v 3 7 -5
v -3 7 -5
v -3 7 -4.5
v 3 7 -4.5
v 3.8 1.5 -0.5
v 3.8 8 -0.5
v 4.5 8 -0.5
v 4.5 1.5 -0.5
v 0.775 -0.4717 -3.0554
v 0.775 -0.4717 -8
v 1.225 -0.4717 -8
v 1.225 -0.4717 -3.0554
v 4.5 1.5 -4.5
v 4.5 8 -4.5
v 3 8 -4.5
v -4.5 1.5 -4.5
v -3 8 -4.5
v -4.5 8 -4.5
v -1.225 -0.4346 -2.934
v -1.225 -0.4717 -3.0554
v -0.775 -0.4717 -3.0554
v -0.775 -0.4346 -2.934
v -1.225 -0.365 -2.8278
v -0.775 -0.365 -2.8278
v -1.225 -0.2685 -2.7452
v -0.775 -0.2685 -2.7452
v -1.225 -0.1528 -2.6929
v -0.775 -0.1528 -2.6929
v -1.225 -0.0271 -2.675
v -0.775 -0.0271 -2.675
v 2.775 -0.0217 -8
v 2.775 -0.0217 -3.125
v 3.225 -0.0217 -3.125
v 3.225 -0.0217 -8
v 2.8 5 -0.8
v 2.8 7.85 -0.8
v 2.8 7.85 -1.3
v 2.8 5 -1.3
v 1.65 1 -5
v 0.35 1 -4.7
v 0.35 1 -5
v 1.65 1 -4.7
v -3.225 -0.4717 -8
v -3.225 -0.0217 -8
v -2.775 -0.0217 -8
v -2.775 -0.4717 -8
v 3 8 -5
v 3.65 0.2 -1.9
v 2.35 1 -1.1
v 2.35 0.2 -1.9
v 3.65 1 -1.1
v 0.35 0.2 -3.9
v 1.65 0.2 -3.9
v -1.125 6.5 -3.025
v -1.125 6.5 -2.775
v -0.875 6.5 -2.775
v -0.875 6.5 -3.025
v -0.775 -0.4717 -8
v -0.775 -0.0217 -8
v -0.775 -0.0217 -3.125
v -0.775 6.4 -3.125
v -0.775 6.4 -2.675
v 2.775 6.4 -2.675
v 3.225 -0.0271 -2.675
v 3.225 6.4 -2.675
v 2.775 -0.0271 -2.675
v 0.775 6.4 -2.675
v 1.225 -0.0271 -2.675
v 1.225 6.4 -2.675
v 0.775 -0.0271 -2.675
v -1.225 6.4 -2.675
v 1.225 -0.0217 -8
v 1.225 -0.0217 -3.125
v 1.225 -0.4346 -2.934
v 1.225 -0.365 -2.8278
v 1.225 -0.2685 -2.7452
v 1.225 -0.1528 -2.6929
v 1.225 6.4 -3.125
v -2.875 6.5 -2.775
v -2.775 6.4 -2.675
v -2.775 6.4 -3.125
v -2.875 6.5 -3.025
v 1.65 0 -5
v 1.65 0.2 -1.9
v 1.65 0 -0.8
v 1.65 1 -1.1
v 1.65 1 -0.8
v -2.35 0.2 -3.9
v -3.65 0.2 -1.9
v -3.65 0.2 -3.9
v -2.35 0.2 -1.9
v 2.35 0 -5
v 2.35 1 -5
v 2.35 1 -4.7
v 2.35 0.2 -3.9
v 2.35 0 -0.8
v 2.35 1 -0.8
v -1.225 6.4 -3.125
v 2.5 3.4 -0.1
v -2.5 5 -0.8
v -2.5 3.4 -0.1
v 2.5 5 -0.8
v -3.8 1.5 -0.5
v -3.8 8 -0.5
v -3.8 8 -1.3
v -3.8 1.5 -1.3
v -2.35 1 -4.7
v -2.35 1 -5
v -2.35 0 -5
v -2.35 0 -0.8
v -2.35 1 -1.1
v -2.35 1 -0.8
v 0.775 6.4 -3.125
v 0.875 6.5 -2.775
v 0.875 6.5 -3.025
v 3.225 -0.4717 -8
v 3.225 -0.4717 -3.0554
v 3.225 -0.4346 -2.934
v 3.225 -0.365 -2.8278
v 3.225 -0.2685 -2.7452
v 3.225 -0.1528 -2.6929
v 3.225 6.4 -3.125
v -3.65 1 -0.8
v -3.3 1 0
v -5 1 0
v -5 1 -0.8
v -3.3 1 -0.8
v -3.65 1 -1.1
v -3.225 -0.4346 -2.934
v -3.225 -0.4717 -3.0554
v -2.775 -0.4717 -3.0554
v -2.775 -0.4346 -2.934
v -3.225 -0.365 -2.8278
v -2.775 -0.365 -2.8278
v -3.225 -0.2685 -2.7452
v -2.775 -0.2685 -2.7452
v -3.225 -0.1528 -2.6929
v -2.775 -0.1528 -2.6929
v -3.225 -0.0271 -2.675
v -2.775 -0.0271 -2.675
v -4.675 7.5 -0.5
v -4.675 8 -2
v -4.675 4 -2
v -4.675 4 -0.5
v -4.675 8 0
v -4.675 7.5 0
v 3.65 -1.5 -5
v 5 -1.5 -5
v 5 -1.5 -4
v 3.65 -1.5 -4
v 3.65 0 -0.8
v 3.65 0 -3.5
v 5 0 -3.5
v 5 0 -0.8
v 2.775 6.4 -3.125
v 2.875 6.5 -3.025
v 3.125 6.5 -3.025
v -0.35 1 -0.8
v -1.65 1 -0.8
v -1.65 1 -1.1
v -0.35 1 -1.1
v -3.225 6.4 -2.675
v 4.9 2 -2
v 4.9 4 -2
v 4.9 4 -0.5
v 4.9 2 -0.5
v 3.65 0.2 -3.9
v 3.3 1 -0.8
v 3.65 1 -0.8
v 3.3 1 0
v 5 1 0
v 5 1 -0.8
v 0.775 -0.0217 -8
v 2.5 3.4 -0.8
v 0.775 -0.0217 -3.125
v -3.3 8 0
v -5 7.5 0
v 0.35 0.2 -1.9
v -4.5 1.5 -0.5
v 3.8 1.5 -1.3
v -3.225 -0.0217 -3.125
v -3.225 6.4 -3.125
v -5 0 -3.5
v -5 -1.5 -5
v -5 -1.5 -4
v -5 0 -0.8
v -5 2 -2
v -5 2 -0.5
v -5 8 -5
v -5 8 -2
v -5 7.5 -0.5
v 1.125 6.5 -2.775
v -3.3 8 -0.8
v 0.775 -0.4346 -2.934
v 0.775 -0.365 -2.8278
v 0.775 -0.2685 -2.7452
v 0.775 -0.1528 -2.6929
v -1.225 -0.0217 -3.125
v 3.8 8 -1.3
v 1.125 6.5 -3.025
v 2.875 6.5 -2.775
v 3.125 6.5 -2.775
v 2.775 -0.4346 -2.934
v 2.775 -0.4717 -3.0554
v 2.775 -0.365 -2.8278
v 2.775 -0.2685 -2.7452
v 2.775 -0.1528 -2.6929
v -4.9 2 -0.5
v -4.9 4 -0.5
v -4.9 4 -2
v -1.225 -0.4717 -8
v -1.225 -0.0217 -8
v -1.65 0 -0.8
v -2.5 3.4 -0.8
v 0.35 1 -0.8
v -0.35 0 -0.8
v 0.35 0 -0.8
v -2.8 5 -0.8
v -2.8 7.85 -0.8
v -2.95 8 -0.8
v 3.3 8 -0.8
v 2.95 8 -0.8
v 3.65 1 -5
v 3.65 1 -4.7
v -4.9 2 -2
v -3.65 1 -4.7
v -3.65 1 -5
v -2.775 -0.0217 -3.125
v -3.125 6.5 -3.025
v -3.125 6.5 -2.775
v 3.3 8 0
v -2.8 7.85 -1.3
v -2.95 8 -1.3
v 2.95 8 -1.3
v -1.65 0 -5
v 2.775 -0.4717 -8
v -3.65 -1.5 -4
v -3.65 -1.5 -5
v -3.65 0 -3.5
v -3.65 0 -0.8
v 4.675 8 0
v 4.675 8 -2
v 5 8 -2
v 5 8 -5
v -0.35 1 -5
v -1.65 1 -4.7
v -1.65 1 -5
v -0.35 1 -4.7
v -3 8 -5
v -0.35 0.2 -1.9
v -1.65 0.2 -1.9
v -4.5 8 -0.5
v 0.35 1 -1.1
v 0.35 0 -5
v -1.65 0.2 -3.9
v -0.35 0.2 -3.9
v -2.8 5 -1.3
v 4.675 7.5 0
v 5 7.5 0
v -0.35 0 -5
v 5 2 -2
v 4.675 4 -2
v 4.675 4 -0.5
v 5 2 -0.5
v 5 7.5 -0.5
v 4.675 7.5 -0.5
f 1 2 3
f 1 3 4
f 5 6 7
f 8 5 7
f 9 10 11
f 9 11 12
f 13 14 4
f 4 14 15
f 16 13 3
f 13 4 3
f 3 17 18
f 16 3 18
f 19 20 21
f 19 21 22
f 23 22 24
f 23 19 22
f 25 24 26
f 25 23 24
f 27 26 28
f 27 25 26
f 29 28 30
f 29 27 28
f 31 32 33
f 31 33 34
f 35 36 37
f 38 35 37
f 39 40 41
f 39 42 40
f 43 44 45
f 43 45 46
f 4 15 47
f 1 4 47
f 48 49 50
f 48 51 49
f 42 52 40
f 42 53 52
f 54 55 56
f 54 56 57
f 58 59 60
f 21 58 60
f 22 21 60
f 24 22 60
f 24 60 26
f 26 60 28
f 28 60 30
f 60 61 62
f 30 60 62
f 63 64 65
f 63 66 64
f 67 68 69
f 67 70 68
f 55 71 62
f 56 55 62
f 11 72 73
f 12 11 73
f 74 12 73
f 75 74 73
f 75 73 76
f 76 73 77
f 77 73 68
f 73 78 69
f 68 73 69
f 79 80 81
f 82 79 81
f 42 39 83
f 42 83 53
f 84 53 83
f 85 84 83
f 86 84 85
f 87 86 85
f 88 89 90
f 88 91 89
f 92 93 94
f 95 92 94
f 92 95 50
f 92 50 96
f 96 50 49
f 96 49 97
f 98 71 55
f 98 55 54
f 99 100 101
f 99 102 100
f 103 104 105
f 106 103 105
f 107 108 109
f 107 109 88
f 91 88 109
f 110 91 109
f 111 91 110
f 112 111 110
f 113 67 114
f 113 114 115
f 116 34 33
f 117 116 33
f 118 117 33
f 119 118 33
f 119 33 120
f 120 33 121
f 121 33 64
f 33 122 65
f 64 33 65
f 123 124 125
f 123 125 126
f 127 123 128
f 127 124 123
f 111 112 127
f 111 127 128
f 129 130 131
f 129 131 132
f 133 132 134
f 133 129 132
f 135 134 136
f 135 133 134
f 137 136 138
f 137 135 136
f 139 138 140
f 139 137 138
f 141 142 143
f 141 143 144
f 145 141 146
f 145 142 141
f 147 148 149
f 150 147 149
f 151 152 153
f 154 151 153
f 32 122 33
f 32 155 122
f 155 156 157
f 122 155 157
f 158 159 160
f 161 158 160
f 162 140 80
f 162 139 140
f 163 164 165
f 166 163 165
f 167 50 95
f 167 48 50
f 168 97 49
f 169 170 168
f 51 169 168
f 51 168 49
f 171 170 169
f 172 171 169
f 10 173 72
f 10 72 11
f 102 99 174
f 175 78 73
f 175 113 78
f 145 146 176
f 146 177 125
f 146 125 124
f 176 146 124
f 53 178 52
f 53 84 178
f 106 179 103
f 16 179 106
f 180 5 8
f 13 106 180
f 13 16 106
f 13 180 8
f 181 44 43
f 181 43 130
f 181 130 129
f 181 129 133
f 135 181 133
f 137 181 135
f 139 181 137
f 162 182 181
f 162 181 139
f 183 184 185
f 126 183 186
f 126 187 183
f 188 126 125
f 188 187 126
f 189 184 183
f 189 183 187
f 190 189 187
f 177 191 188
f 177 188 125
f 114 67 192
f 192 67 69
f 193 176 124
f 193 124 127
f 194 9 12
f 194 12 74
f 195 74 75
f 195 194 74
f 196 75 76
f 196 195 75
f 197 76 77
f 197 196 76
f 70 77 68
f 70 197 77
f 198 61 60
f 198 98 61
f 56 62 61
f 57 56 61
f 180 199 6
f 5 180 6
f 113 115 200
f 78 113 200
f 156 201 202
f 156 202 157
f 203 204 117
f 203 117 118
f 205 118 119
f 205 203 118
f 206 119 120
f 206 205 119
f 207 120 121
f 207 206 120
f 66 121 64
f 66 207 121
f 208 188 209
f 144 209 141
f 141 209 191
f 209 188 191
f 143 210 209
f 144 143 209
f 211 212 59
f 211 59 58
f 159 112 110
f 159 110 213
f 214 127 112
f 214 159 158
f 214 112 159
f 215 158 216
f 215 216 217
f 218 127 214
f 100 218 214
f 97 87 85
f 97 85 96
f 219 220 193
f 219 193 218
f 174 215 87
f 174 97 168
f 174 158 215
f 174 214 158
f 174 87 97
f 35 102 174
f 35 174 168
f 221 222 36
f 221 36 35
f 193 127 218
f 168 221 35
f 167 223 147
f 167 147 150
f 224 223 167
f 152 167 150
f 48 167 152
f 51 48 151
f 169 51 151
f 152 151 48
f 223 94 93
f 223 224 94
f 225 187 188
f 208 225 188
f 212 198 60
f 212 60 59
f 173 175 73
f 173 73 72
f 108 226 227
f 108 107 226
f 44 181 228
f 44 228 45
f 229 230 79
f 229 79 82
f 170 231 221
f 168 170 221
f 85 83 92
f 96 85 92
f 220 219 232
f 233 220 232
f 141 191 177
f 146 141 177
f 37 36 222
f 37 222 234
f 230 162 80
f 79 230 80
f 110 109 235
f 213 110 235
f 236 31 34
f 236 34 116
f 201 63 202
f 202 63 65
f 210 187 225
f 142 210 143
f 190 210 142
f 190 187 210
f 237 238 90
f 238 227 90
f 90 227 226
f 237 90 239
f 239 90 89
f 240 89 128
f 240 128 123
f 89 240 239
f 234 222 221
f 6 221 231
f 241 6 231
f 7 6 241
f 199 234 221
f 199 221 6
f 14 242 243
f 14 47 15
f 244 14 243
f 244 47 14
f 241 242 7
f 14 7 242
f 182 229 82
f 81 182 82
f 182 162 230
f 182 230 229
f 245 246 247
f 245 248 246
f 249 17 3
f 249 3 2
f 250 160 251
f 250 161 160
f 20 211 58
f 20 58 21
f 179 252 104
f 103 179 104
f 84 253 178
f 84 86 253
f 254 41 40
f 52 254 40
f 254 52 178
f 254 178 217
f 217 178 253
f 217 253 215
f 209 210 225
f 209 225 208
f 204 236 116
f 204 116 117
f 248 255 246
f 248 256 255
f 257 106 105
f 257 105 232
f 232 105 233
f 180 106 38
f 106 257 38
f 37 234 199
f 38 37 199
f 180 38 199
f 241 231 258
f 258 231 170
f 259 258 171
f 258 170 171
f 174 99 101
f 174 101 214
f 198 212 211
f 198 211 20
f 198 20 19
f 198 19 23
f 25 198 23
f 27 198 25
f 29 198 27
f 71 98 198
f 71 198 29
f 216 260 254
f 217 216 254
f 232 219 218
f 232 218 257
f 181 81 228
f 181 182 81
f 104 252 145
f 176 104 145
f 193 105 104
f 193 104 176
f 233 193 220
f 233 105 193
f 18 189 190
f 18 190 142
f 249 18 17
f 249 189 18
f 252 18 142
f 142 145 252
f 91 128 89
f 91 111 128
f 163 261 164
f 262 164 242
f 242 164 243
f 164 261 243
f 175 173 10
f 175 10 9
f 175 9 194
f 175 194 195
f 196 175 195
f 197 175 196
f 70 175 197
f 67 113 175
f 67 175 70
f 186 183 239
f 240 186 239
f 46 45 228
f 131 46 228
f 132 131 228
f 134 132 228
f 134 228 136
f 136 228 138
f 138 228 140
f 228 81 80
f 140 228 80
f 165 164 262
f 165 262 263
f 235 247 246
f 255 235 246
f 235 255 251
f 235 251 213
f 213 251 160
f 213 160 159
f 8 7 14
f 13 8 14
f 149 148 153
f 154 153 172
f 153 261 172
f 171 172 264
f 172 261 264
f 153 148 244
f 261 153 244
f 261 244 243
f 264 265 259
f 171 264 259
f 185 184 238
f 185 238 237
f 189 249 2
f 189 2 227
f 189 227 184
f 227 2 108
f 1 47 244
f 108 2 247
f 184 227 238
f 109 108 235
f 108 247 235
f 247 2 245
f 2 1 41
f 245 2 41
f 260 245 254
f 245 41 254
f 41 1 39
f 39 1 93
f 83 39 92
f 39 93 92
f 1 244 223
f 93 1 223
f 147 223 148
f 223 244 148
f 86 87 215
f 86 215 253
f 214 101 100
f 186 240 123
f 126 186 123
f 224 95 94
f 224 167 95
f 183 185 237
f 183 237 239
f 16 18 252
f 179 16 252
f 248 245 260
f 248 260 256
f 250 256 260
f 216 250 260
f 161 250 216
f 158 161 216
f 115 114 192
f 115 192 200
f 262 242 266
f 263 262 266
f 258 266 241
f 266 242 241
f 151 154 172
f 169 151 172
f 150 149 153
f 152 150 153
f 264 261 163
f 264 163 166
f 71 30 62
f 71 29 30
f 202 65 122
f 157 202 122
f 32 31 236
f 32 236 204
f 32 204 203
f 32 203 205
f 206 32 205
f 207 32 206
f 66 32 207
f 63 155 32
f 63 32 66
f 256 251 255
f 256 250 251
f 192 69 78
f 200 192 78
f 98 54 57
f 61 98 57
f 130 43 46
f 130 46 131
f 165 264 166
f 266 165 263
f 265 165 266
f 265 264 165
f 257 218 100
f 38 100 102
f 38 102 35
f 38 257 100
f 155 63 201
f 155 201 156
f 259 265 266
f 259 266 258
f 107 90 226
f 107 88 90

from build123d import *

# Parameters (mm, degrees)
ESQUISSE1_W                = 10
ESQUISSE1_H                = 5
BOSS_EXTRU_1_DEPTH         = 8
ESQUISSE7_W                = 0.8
ESQUISSE7_H                = 1
ENL_V_MAT_EXTRU_5_DEPTH    = 14.747727085
ENL_V_MAT_EXTRU_6_DEPTH    = 0.65
R_P_TITION_LIN_AIRE3_COUNT = 4
R_P_TITION_LIN_AIRE3_PITCH = 2
ESQUISSE2_W                = 6.6
ESQUISSE2_H                = 1.6
ENL_V_MAT_EXTRU_1_DEPTH    = 11.677078252
ENL_V_MAT_EXTRU_2_DEPTH    = 6.5
ESQUISSE5_W                = 6
ESQUISSE5_H                = 1
ENL_V_MAT_EXTRU_3_DEPTH    = 1
ESQUISSE6_W                = 5.6
ESQUISSE6_H                = 1
ENL_V_MAT_EXTRU_4_DEPTH    = 3
BOSS_EXTRU_2_DEPTH         = 2.5
CHANFREIN1_SIZE            = 0.15
EXTRU_MINCE2_DEPTH         = 0.225
R_P_TITION_LIN_AIRE4_COUNT = 4
R_P_TITION_LIN_AIRE4_PITCH = 2
BOSS_EXTRU_4_DEPTH         = 1.35
CHANFREIN2_SIZE            = 0.1
ESQUISSE19_W               = 1.5
ESQUISSE19_H               = 6.440145877
ENL_V_MAT_EXTRU_7_DEPTH    = 0.1
ENL_V_MAT_EXTRU_8_DEPTH    = 0.225
CHANFREIN3_SIZE            = 0.1
CHANFREIN4_SIZE            = 0.1
CHANFREIN5_SIZE            = 0.1


with BuildPart() as part:
    # Esquisse1 → Boss.-Extru.1 (new body)
    with BuildSketch(Plane(origin=(0, 0, 0), x_dir=(1, 0, 0), z_dir=(0, 1, 0))):
        with Locations((0, 2.5)):
            Rectangle(ESQUISSE1_W, ESQUISSE1_H)
    extrude(amount=BOSS_EXTRU_1_DEPTH)

    # Esquisse7 → Enlèv. mat.-Extru.5 (cut, through all)
    with BuildSketch(Plane(origin=(5, 0, 0), x_dir=(0, 0, -1), z_dir=(1, 0, 0))):
        with Locations((0.4, 0.5)):
            Rectangle(ESQUISSE7_W, ESQUISSE7_H)
    extrude(amount=-ENL_V_MAT_EXTRU_5_DEPTH, mode=Mode.SUBTRACT)

    # Esquisse8 → Enlèv. mat.-Extru.6 (cut, symmetric)
    with BuildSketch(Plane(origin=(3, 0, 0), x_dir=(0, 0, -1), z_dir=(1, 0, 0))):
        Polygon((0.8, 1), (1.1, 1), (1.9, 0.2), (3.9, 0.2), (4.7, 1), (5, 1), (5, 0), (0.8, 0), align=None)
    enl_v_mat_extru_6 = extrude(amount=ENL_V_MAT_EXTRU_6_DEPTH, both=True, mode=Mode.SUBTRACT)

    # Répétition linéaire3: Enlèv. mat.-Extru.6 ×4
    with Locations(*[(-i * R_P_TITION_LIN_AIRE3_PITCH, 0, 0) for i in range(1, R_P_TITION_LIN_AIRE3_COUNT)]):
        add(enl_v_mat_extru_6, mode=Mode.SUBTRACT)

    # Esquisse2 → Enlèv. mat.-Extru.1 (cut, through all)
    with BuildSketch(Plane(origin=(0, 8, 0), x_dir=(1, 0, 0), z_dir=(0, 1, 0))):
        Rectangle(ESQUISSE2_W, ESQUISSE2_H)
    extrude(amount=-ENL_V_MAT_EXTRU_1_DEPTH, mode=Mode.SUBTRACT)

    # Esquisse4 → Enlèv. mat.-Extru.2 (cut)
    with BuildSketch(Plane(origin=(0, 8, 0), x_dir=(1, 0, 0), z_dir=(0, 1, 0))):
        Polygon((-3.8, 1.3), (3.8, 1.3), (3.8, 0.5), (4.5, 0.5), (4.5, 4.5), (-4.5, 4.5), (-4.5, 0.5), (-3.8, 0.5), align=None)
    extrude(amount=-ENL_V_MAT_EXTRU_2_DEPTH, mode=Mode.SUBTRACT)

    # Esquisse5 → Enlèv. mat.-Extru.3 (cut)
    with BuildSketch(Plane(origin=(0, 8, 0), x_dir=(1, 0, 0), z_dir=(0, 1, 0))):
        with Locations((0, 4.5)):
            Rectangle(ESQUISSE5_W, ESQUISSE5_H)
    extrude(amount=-ENL_V_MAT_EXTRU_3_DEPTH, mode=Mode.SUBTRACT)

    # Esquisse6 → Enlèv. mat.-Extru.4 (cut)
    with BuildSketch(Plane(origin=(0, 8, 0), x_dir=(1, 0, 0), z_dir=(0, 1, 0))):
        with Locations((0, 0.8)):
            Rectangle(ESQUISSE6_W, ESQUISSE6_H)
    extrude(amount=-ENL_V_MAT_EXTRU_4_DEPTH, mode=Mode.SUBTRACT)

    # Esquisse11 → Boss.-Extru.2 (add, symmetric)
    with BuildSketch(Plane(origin=(0, 0, 0), x_dir=(0, 0, -1), z_dir=(1, 0, 0))):
        Polygon((0.8, 5), (0.1, 3.4), (0.8, 3.4), align=None)
    extrude(amount=BOSS_EXTRU_2_DEPTH, both=True)

    # Chanfrein1
    chanfrein1_edges = [part.edges().sort_by_distance(p)[0] for p in [
        (2.8, 8, -1.05),
        (-2.8, 8, -1.05),
    ]]
    chamfer(chanfrein1_edges, length=CHANFREIN1_SIZE)

    # Esquisse18 → Boss.-Extru.4 (add)
    with BuildSketch(Plane.ZY.offset(5)):
        Polygon((-5, 0), (-5, -1.5), (-4, -1.5), (-3.5, 0), align=None)
    boss_extru_4 = extrude(amount=-BOSS_EXTRU_4_DEPTH)

    # Esquisse19 → Enlèv. mat.-Extru.7 (cut)
    with BuildSketch(Plane.ZY.offset(5)):
        with Locations((-1.25, 5.220072939)):
            Rectangle(ESQUISSE19_W, ESQUISSE19_H)
    enl_v_mat_extru_7 = extrude(amount=-ENL_V_MAT_EXTRU_7_DEPTH, mode=Mode.SUBTRACT)

    # Esquisse20 → Enlèv. mat.-Extru.8 (cut, symmetric)
    with BuildSketch(Plane.ZY.offset(4.9)):
        Polygon((-2, 4), (-0.5, 4), (-0.5, 7.5), (0.56066855, 7.5), (0.56066855, 8.388803524), (-2, 8.388803524), align=None)
    enl_v_mat_extru_8 = extrude(amount=ENL_V_MAT_EXTRU_8_DEPTH, both=True, mode=Mode.SUBTRACT)

    # Symétrie5: Enlèv. mat.-Extru.7 across plane
    add(enl_v_mat_extru_7.mirror(Plane(origin=(0, 0, 0), x_dir=(0, 0, 1), z_dir=(1, 0, 0))), mode=Mode.SUBTRACT)

    # Symétrie6: Enlèv. mat.-Extru.8 across plane
    add(enl_v_mat_extru_8.mirror(Plane(origin=(0, 0, 0), x_dir=(0, 0, 1), z_dir=(1, 0, 0))), mode=Mode.SUBTRACT)

    # Symétrie8: Boss.-Extru.4 across plane
    add(boss_extru_4.mirror(Plane(origin=(0, 0, 0), x_dir=(0, 0, 1), z_dir=(1, 0, 0))))


with BuildPart() as body_2:
    # Esquisse16 → Extru.-Mince2 (new, symmetric)
    with BuildSketch(Plane.ZY.offset(-3)):
        with BuildLine():
            Line((-3.125, 6.5), (-3.125, -0.021727788))
            Line((-3.125, -0.021727788), (-8, -0.021727788))
            Line((-8, -0.021727788), (-8, -0.471727788))
            Line((-8, -0.471727788), (-3.05543443, -0.471727788))
            ThreePointArc((-3.05543443, -0.471727788), (-2.783090285, -0.319708306), (-2.675, -0.02713738))
            Line((-2.675, -0.02713738), (-2.675, 6.5))
            Line((-2.675, 6.5), (-3.125, 6.5))
        make_face()
    extrude(amount=EXTRU_MINCE2_DEPTH, both=True)


with BuildPart() as r_p_tition_lin_aire4_1:
    # Répétition linéaire4: pattern copy
    add(body_2.part.moved(Location(Vector(-1, 0, 0) * (1 * R_P_TITION_LIN_AIRE4_PITCH))))

    # Chanfrein5
    chanfrein5_edges = [r_p_tition_lin_aire4_1.edges().sort_by_distance(p)[0] for p in [
        (1, 6.5, -3.125),
        (1, 6.5, -2.675),
        (0.775, 6.5, -2.9),
        (1.225, 6.5, -2.9),
    ]]
    chamfer(chanfrein5_edges, length=CHANFREIN5_SIZE)


with BuildPart() as r_p_tition_lin_aire4_2:
    # Répétition linéaire4: pattern copy
    add(body_2.part.moved(Location(Vector(-1, 0, 0) * (2 * R_P_TITION_LIN_AIRE4_PITCH))))

    # Chanfrein4
    chanfrein4_edges = [r_p_tition_lin_aire4_2.edges().sort_by_distance(p)[0] for p in [
        (-1, 6.5, -3.125),
        (-1, 6.5, -2.675),
        (-1.225, 6.5, -2.9),
        (-0.775, 6.5, -2.9),
    ]]
    chamfer(chanfrein4_edges, length=CHANFREIN4_SIZE)


with BuildPart() as r_p_tition_lin_aire4_3:
    # Répétition linéaire4: pattern copy
    add(body_2.part.moved(Location(Vector(-1, 0, 0) * (3 * R_P_TITION_LIN_AIRE4_PITCH))))

    # Chanfrein3
    chanfrein3_edges = [r_p_tition_lin_aire4_3.edges().sort_by_distance(p)[0] for p in [
        (-3, 6.5, -3.125),
        (-3, 6.5, -2.675),
        (-3.225, 6.5, -2.9),
        (-2.775, 6.5, -2.9),
    ]]
    chamfer(chanfrein3_edges, length=CHANFREIN3_SIZE)


with BuildPart() as body_2_1:
    add(body_2.part)

    # Chanfrein2
    chanfrein2_edges = [body_2_1.edges().sort_by_distance(p)[0] for p in [
        (3, 6.5, -3.125),
        (3, 6.5, -2.675),
        (2.775, 6.5, -2.9),
        (3.225, 6.5, -2.9),
    ]]
    chamfer(chanfrein2_edges, length=CHANFREIN2_SIZE)


solid = Compound([part.part, r_p_tition_lin_aire4_1.part, r_p_tition_lin_aire4_2.part, r_p_tition_lin_aire4_3.part, body_2_1.part])
